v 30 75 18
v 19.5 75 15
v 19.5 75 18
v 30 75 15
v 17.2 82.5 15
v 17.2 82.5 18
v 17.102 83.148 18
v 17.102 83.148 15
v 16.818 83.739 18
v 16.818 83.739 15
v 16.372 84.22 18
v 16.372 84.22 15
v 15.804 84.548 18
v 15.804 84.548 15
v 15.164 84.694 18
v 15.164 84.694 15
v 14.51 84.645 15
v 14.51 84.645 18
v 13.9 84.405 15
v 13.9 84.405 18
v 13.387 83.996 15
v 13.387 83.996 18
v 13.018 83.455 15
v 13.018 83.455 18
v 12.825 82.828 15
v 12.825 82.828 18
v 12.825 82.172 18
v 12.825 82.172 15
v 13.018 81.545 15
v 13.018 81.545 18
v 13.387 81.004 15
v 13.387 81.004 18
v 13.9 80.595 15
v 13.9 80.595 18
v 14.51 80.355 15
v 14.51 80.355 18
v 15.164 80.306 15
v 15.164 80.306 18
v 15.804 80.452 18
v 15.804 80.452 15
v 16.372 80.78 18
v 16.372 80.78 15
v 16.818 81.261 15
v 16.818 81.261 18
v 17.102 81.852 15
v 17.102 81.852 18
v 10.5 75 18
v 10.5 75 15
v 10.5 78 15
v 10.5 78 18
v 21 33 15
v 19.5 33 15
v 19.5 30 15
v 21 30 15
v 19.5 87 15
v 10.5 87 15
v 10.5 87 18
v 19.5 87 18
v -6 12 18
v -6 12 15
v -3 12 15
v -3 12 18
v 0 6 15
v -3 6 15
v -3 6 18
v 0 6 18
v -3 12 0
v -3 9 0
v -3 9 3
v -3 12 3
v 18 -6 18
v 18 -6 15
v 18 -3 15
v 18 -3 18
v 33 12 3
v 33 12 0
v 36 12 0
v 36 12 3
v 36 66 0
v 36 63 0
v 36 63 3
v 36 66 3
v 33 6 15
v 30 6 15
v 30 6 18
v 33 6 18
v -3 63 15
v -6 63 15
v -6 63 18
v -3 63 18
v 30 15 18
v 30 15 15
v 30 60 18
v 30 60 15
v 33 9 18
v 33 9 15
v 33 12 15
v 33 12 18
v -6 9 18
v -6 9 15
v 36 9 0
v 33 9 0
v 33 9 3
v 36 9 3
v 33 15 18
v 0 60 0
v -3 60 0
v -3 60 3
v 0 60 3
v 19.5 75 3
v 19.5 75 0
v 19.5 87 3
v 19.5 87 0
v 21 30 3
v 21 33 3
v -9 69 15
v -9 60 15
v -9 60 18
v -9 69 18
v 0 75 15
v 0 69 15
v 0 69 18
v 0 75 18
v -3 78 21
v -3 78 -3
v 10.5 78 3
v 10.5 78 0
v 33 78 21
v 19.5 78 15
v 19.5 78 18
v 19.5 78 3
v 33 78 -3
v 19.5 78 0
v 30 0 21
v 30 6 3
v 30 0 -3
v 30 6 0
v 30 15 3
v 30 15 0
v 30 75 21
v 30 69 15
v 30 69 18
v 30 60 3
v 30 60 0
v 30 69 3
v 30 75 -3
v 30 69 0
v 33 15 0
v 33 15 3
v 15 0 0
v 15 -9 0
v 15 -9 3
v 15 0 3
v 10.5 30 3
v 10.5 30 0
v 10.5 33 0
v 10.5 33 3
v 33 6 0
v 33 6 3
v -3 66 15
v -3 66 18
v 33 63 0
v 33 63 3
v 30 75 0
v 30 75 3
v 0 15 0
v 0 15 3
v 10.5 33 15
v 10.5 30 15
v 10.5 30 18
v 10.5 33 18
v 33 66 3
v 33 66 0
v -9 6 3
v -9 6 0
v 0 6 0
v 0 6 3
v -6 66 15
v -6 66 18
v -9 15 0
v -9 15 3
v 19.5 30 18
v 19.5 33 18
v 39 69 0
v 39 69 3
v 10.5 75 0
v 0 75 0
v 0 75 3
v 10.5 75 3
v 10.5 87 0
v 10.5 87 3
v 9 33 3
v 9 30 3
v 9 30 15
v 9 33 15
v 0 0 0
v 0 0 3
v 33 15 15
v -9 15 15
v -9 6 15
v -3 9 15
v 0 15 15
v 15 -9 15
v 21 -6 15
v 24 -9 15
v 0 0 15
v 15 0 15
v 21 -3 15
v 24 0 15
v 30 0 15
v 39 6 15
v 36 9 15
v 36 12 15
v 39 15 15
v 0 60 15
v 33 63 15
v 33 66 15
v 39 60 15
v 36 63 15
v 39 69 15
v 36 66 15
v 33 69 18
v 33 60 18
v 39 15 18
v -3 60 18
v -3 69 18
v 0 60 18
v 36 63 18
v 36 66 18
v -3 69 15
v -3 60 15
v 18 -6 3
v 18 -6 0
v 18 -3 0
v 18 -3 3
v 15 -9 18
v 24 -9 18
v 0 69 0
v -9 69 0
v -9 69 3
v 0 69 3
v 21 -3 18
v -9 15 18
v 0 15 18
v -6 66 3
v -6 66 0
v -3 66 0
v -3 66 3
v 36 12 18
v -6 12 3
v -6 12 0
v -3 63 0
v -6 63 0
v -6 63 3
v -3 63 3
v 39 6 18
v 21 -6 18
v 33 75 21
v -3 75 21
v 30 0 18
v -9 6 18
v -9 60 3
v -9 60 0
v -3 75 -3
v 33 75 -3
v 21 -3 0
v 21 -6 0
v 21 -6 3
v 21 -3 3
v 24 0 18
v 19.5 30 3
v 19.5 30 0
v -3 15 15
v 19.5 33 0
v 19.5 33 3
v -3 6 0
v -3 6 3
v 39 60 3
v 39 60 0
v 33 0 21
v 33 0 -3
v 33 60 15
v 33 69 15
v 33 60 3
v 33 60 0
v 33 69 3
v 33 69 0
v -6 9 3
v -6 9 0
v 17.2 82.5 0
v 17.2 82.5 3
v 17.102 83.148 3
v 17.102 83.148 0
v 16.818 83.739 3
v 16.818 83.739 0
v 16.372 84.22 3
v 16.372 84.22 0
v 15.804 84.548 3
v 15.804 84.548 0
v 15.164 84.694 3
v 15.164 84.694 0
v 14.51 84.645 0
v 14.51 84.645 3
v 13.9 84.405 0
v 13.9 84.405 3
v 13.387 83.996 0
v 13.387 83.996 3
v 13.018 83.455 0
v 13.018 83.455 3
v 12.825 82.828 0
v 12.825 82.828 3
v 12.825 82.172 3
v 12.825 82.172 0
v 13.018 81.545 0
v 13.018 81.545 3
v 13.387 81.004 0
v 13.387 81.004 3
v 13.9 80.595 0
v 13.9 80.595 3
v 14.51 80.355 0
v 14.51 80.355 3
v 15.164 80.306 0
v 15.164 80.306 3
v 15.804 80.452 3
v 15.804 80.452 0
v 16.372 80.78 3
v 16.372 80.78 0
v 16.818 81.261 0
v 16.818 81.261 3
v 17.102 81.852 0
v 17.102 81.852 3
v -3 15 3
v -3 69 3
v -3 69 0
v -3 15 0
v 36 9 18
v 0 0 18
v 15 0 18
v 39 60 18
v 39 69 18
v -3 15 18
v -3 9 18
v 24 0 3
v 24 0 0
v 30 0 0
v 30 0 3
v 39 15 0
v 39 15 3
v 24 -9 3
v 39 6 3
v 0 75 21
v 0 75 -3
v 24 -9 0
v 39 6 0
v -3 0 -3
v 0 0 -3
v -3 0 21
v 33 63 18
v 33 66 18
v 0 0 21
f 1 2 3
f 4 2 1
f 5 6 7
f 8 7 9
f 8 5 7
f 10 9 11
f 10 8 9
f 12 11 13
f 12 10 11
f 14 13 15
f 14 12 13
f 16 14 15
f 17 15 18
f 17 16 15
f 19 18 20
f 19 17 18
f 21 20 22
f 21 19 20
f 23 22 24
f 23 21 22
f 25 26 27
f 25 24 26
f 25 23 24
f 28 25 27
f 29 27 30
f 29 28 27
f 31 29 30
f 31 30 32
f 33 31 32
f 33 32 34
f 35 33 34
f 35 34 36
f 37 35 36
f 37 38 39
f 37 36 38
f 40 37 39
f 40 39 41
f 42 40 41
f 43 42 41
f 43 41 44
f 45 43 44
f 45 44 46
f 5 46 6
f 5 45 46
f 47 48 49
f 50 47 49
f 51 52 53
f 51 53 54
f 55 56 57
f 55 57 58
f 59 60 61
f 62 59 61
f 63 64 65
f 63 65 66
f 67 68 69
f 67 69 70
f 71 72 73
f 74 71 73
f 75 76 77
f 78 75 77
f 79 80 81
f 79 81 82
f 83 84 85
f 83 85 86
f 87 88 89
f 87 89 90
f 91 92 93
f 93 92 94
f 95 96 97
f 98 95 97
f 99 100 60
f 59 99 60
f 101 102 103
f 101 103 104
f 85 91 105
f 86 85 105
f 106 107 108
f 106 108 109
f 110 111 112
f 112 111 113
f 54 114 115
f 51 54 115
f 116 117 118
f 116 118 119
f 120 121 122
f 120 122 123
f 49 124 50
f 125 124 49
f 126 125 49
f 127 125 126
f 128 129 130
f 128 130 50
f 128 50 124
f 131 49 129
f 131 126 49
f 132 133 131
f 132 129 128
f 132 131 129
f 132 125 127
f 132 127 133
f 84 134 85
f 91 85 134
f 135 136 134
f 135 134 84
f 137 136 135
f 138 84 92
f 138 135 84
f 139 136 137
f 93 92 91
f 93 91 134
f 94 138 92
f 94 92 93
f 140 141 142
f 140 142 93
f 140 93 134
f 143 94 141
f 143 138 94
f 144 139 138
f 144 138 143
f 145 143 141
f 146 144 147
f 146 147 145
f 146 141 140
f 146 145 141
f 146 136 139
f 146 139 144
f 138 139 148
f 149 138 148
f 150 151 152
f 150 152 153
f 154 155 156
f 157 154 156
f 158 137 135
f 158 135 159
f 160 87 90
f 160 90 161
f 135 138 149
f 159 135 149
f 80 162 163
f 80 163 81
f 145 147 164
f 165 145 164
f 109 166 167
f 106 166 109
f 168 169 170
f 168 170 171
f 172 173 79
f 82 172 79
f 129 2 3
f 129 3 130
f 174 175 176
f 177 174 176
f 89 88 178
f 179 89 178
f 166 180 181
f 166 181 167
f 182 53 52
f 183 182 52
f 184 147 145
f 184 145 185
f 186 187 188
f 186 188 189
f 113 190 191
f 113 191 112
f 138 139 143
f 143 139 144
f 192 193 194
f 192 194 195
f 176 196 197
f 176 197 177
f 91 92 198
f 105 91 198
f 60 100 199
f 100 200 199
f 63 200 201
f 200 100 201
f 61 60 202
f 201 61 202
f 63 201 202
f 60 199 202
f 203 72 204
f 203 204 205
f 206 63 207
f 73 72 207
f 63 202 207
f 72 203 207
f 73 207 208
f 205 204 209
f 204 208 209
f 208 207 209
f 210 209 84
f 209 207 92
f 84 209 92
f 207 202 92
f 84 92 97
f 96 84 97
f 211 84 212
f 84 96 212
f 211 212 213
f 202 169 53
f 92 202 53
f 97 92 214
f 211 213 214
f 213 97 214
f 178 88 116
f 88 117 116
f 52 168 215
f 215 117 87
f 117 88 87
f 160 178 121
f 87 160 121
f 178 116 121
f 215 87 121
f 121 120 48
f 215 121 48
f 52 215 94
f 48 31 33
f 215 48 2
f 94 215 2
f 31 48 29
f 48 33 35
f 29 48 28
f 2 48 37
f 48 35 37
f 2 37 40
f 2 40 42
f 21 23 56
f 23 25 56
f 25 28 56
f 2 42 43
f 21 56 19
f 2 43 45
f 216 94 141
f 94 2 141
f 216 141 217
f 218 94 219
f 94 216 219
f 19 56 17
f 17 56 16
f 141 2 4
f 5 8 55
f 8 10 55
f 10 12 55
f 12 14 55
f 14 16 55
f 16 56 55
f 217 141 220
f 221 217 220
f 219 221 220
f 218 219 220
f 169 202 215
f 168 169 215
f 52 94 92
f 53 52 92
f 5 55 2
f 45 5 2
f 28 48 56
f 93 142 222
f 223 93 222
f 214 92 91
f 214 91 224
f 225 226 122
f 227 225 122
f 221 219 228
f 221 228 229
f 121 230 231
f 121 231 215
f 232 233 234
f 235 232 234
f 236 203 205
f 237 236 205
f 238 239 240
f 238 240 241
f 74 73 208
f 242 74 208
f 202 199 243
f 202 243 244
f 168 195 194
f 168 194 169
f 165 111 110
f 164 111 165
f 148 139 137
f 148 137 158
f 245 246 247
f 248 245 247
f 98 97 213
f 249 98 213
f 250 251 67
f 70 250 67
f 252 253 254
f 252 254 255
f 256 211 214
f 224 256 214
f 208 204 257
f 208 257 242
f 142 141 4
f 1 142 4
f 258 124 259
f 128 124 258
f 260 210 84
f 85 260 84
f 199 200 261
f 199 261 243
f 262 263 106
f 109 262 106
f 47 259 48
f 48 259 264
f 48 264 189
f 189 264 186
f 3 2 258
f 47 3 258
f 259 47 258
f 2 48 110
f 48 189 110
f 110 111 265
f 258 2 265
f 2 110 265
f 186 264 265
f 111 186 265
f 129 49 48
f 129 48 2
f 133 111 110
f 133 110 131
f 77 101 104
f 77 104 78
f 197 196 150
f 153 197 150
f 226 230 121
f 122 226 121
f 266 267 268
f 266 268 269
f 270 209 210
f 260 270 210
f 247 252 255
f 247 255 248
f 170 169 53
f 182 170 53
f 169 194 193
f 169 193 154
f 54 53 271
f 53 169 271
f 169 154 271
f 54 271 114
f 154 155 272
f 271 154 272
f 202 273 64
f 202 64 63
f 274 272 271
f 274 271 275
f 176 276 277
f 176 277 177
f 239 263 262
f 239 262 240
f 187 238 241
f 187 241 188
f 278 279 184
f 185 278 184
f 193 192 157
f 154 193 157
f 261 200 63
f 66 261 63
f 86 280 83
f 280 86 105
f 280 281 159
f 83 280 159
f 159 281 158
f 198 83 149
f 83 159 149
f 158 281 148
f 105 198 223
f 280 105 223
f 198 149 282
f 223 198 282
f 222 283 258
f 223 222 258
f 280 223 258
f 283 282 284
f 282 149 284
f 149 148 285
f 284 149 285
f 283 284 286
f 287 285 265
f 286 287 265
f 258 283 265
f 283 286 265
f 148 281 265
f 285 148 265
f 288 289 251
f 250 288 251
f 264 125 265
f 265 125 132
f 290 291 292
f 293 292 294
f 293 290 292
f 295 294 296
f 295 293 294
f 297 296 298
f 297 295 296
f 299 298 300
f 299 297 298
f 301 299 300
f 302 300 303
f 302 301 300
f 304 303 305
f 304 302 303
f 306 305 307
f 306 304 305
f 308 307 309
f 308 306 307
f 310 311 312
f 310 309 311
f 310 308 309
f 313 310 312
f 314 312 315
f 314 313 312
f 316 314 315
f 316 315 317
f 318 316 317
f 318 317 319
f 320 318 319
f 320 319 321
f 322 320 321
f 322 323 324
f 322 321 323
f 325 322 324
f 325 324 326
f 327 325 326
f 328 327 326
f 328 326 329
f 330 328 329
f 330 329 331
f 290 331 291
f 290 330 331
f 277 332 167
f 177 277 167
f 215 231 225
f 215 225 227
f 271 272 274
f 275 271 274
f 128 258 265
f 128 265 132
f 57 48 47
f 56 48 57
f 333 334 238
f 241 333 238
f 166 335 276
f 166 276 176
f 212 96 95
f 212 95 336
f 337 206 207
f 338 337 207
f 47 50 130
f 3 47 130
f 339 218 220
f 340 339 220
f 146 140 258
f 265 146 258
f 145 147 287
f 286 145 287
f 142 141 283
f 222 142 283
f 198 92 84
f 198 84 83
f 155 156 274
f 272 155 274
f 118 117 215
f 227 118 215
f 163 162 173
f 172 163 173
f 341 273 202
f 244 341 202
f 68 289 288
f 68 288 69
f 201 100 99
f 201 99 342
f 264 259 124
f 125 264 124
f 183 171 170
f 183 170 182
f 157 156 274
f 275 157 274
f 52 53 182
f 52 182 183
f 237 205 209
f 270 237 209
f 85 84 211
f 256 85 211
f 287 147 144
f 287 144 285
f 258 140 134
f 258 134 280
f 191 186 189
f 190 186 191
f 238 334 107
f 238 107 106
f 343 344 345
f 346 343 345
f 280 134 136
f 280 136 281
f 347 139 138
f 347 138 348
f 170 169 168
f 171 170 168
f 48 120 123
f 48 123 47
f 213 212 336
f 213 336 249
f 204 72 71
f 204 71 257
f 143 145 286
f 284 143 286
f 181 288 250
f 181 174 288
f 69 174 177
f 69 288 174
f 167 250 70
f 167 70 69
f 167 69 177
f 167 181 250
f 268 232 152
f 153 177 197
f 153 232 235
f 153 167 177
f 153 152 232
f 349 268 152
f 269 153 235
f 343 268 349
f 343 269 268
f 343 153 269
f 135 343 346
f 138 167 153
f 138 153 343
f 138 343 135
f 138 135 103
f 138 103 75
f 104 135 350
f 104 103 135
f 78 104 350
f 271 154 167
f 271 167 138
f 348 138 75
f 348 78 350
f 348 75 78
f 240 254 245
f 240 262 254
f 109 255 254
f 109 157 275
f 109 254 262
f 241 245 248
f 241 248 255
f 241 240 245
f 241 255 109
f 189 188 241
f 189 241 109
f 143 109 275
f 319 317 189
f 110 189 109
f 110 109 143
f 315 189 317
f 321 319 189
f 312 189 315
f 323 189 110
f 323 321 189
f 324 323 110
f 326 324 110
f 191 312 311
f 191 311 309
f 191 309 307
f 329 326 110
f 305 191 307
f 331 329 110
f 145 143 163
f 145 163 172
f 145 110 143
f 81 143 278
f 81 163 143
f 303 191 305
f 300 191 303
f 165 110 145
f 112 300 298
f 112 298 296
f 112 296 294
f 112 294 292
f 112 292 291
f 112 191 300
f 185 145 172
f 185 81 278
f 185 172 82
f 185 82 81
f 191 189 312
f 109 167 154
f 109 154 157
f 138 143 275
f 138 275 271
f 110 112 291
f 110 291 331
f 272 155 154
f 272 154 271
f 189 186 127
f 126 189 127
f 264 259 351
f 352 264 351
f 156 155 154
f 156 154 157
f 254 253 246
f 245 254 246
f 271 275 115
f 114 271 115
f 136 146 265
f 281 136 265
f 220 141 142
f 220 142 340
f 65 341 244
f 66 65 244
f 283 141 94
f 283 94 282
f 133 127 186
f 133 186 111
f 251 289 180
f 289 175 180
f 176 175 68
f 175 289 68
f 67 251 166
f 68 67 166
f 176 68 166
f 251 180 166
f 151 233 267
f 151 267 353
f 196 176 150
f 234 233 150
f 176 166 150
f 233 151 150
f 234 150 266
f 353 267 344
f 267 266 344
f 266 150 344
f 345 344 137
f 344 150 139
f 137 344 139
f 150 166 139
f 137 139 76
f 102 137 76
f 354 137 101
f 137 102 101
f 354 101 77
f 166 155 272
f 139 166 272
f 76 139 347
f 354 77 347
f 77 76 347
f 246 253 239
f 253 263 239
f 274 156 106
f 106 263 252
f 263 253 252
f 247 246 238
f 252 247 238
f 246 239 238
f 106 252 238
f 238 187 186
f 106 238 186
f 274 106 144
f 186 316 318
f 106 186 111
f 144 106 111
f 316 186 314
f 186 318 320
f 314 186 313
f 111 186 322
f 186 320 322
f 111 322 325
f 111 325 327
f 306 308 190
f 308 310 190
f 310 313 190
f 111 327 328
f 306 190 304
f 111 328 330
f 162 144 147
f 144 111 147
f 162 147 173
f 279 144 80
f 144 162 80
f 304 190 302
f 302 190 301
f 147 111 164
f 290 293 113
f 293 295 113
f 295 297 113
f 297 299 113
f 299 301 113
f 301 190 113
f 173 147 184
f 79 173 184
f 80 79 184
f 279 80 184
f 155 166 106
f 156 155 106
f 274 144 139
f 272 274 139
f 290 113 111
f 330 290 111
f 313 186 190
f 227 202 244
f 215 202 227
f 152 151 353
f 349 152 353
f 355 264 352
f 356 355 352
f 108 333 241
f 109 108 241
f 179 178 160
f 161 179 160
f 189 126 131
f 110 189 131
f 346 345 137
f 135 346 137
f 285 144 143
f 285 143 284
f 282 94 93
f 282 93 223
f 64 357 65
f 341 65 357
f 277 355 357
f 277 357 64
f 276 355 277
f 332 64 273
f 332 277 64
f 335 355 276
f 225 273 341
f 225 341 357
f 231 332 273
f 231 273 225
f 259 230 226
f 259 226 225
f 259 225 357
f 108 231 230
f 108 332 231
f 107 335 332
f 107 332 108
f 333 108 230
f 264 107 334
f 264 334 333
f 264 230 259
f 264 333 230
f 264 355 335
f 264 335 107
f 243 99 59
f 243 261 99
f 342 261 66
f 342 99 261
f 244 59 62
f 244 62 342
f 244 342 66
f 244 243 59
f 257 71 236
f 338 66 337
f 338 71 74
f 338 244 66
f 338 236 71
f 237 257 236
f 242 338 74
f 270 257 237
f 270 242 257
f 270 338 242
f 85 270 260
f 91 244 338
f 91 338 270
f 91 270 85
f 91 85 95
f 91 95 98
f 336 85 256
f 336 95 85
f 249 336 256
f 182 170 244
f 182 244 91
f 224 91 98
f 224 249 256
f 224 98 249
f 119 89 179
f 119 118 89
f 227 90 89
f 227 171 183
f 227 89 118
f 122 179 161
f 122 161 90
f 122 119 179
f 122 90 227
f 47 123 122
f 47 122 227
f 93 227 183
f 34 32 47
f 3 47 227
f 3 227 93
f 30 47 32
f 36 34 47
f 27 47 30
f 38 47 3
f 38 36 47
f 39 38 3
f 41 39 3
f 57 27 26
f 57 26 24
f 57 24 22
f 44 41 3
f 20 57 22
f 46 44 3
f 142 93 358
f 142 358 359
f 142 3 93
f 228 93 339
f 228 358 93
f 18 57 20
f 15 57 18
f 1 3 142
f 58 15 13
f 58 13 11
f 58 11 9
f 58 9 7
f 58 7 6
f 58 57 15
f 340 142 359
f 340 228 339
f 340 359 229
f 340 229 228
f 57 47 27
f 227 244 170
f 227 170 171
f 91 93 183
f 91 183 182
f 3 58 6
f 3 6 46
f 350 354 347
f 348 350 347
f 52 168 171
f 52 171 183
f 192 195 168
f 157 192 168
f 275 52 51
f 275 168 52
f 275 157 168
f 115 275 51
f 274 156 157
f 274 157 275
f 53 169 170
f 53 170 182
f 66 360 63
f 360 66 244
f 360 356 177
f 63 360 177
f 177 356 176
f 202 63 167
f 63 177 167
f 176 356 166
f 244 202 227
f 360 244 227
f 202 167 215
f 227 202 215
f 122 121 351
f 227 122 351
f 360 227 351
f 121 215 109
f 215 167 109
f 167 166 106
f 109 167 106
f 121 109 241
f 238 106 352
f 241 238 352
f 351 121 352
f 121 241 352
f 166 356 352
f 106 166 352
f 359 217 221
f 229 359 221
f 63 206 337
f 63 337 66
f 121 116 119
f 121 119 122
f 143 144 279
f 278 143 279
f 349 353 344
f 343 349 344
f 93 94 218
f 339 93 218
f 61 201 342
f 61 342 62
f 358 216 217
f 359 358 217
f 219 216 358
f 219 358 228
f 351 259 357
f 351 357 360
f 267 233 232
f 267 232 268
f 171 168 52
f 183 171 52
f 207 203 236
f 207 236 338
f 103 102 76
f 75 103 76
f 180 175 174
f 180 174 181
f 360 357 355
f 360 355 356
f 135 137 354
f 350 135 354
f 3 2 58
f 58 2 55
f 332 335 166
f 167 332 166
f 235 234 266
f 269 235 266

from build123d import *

# Parameters (mm, degrees)
BOX_W             = 12
BOX_H             = 3
BOX_DEPTH         = 12
BOX111_W          = 9
BOX111_H          = 3
BOX111_DEPTH      = 3
BOX112_W          = 9
BOX112_H          = 3
BOX112_DEPTH      = 3
BOX125_W          = 9
BOX125_H          = 3
BOX125_DEPTH      = 3
BOX123_W          = 9
BOX123_H          = 3
BOX123_DEPTH      = 3
BOX124_W          = 36
BOX124_H          = 3
BOX124_DEPTH      = 24
BOX126_W          = 9
BOX126_H          = 3
BOX126_DEPTH      = 3
BOX084_W          = 3
BOX084_H          = 3
BOX084_DEPTH      = 4
BOX083_W          = 9
BOX083_H          = 9
BOX083_DEPTH      = 3
BOX086_W          = 3
BOX086_H          = 3
BOX086_DEPTH      = 4
BOX085_W          = 9
BOX085_H          = 9
BOX085_DEPTH      = 3
BOX088_W          = 3
BOX088_H          = 3
BOX088_DEPTH      = 4
BOX087_W          = 9
BOX087_H          = 9
BOX087_DEPTH      = 3
BOX004_W          = 3
BOX004_H          = 3
BOX004_DEPTH      = 4
BOX003_W          = 9
BOX003_H          = 9
BOX003_DEPTH      = 3
BOX005_W          = 9
BOX005_H          = 3
BOX005_DEPTH      = 3
BOX082_W          = 30
BOX082_H          = 75
BOX082_DEPTH      = 3
BOX002_W          = 3
BOX002_H          = 3
BOX002_DEPTH      = 4
BOX001_W          = 9
BOX001_H          = 9
BOX001_DEPTH      = 3
CYLINDER027_R     = 2.2
CYLINDER027_DEPTH = 10
BOX006_W          = 9
BOX006_H          = 9
BOX006_DEPTH      = 3
BOX113_W          = 3
BOX113_H          = 9
BOX113_DEPTH      = 3
BOX114_W          = 3
BOX114_H          = 9
BOX114_DEPTH      = 3
BOX115_W          = 3
BOX115_H          = 9
BOX115_DEPTH      = 3
BOX116_W          = 3
BOX116_H          = 9
BOX116_DEPTH      = 3
BOX117_W          = 3
BOX117_H          = 75
BOX117_DEPTH      = 24
BOX127_W          = 3
BOX127_H          = 9
BOX127_DEPTH      = 3
BOX128_W          = 3
BOX128_H          = 9
BOX128_DEPTH      = 3
BOX129_W          = 3
BOX129_H          = 9
BOX129_DEPTH      = 3
BOX130_W          = 3
BOX130_H          = 9
BOX130_DEPTH      = 3
BOX131_W          = 3
BOX131_H          = 75
BOX131_DEPTH      = 24
BOX145_W          = 9
BOX145_H          = 3
BOX145_DEPTH      = 3
BOX140_W          = 3
BOX140_H          = 3
BOX140_DEPTH      = 4
BOX139_W          = 9
BOX139_H          = 9
BOX139_DEPTH      = 3
BOX142_W          = 3
BOX142_H          = 3
BOX142_DEPTH      = 4
BOX141_W          = 9
BOX141_H          = 9
BOX141_DEPTH      = 3
BOX144_W          = 3
BOX144_H          = 3
BOX144_DEPTH      = 4
BOX143_W          = 9
BOX143_H          = 9
BOX143_DEPTH      = 3
BOX136_W          = 3
BOX136_H          = 3
BOX136_DEPTH      = 4
BOX135_W          = 9
BOX135_H          = 9
BOX135_DEPTH      = 3
BOX137_W          = 9
BOX137_H          = 3
BOX137_DEPTH      = 3
BOX132_W          = 30
BOX132_H          = 75
BOX132_DEPTH      = 3
BOX134_W          = 3
BOX134_H          = 3
BOX134_DEPTH      = 4
BOX133_W          = 9
BOX133_H          = 9
BOX133_DEPTH      = 3
CYLINDER028_R     = 2.2
CYLINDER028_DEPTH = 10
BOX138_W          = 9
BOX138_H          = 9
BOX138_DEPTH      = 3


with BuildPart() as cube:
    # Box → Box (new body)
    with BuildSketch(Plane(origin=(-0.5, 12, 3), x_dir=(1, 0, 0), z_dir=(0, 0, 1))):
        with Locations((6, 1.5)):
            Rectangle(BOX_W, BOX_H)
    extrude(amount=BOX_DEPTH)


with BuildPart() as cube033:
    # Box111 → Box111 (new body)
    with BuildSketch(Plane(origin=(1, 12, 15), x_dir=(1, 0, 0), z_dir=(0, 0, 1))):
        with Locations((4.5, 1.5)):
            Rectangle(BOX111_W, BOX111_H)
    extrude(amount=BOX111_DEPTH)


with BuildPart() as turretpitchholderdistant:
    # Box112 → Box112 (new body)
    with BuildSketch(Plane(origin=(1, 12, 0), x_dir=(1, 0, 0), z_dir=(0, 0, 1))):
        with Locations((4.5, 1.5)):
            Rectangle(BOX112_W, BOX112_H)
    extrude(amount=BOX112_DEPTH)

    # Fusion030: union Cube, Cube033
    add(cube.part)
    add(cube033.part)


with BuildPart() as turretpitchholderdistant_1:
    # Fusion030 placement: moved
    add(turretpitchholderdistant.part.moved(Location((9.5, 18, 0))))


with BuildPart() as cube047:
    # Box125 → Box125 (new body)
    with BuildSketch(Plane(origin=(10.5, -3, 15), x_dir=(1, 0, 0), z_dir=(0, 0, 1))):
        with Locations((4.5, 1.5)):
            Rectangle(BOX125_W, BOX125_H)
    extrude(amount=BOX125_DEPTH)


with BuildPart() as cube045:
    # Box123 → Box123 (new body)
    with BuildSketch(Plane(origin=(10.5, -3, 0), x_dir=(1, 0, 0), z_dir=(0, 0, 1))):
        with Locations((4.5, 1.5)):
            Rectangle(BOX123_W, BOX123_H)
    extrude(amount=BOX123_DEPTH)


with BuildPart() as turretpitchholdertopplate:
    # Box124 → Box124 (new body)
    with BuildSketch(Plane(origin=(-3, -3, -3), x_dir=(1, 0, 0), z_dir=(0, 0, 1))):
        with Locations((18, 1.5)):
            Rectangle(BOX124_W, BOX124_H)
    extrude(amount=BOX124_DEPTH)

    # Cut052: cut Cube045
    add(cube045.part, mode=Mode.SUBTRACT)

    # Cut058: cut Cube047
    add(cube047.part, mode=Mode.SUBTRACT)


with BuildPart() as turretpitchholdertopplate_1:
    # Cut058 placement: moved
    add(turretpitchholdertopplate.part.moved(Location((0, 78, 0))))


with BuildPart() as cube048:
    # Box126 → Box126 (new body)
    with BuildSketch(Plane(origin=(10.5, 75, 0), x_dir=(1, 0, 0), z_dir=(0, 0, 1))):
        with Locations((4.5, 1.5)):
            Rectangle(BOX126_W, BOX126_H)
    extrude(amount=BOX126_DEPTH)


with BuildPart() as cube014:
    # Box084 → Box084 (new body)
    with BuildSketch(Plane(origin=(-6, 9, 0), x_dir=(1, 0, 0), z_dir=(0, 0, 1))):
        with Locations((1.5, 1.5)):
            Rectangle(BOX084_W, BOX084_H)
    extrude(amount=BOX084_DEPTH)


with BuildPart() as cut035:
    # Box083 → Box083 (new body)
    with BuildSketch(Plane(origin=(-9, 6, 0), x_dir=(1, 0, 0), z_dir=(0, 0, 1))):
        with Locations((4.5, 4.5)):
            Rectangle(BOX083_W, BOX083_H)
    extrude(amount=BOX083_DEPTH)

    # Cut035: cut Cube014
    add(cube014.part, mode=Mode.SUBTRACT)


with BuildPart() as cut035_1:
    # Cut035 placement: moved
    add(cut035.part.moved(Location((24, -15, 0))))


with BuildPart() as cube016:
    # Box086 → Box086 (new body)
    with BuildSketch(Plane(origin=(-6, 9, 0), x_dir=(1, 0, 0), z_dir=(0, 0, 1))):
        with Locations((1.5, 1.5)):
            Rectangle(BOX086_W, BOX086_H)
    extrude(amount=BOX086_DEPTH)


with BuildPart() as cut036:
    # Box085 → Box085 (new body)
    with BuildSketch(Plane(origin=(-9, 6, 0), x_dir=(1, 0, 0), z_dir=(0, 0, 1))):
        with Locations((4.5, 4.5)):
            Rectangle(BOX085_W, BOX085_H)
    extrude(amount=BOX085_DEPTH)

    # Cut036: cut Cube016
    add(cube016.part, mode=Mode.SUBTRACT)


with BuildPart() as cut036_1:
    # Cut036 placement: moved
    add(cut036.part.moved(Location((39, 54, 0))))


with BuildPart() as cube018:
    # Box088 → Box088 (new body)
    with BuildSketch(Plane(origin=(-6, 9, 0), x_dir=(1, 0, 0), z_dir=(0, 0, 1))):
        with Locations((1.5, 1.5)):
            Rectangle(BOX088_W, BOX088_H)
    extrude(amount=BOX088_DEPTH)


with BuildPart() as cut037:
    # Box087 → Box087 (new body)
    with BuildSketch(Plane(origin=(-9, 6, 0), x_dir=(1, 0, 0), z_dir=(0, 0, 1))):
        with Locations((4.5, 4.5)):
            Rectangle(BOX087_W, BOX087_H)
    extrude(amount=BOX087_DEPTH)

    # Cut037: cut Cube018
    add(cube018.part, mode=Mode.SUBTRACT)


with BuildPart() as cut037_1:
    # Cut037 placement: moved
    add(cut037.part.moved(Location((0, 54, 0))))


with BuildPart() as cube010:
    # Box004 → Box004 (new body)
    with BuildSketch(Plane(origin=(-6, 9, 0), x_dir=(1, 0, 0), z_dir=(0, 0, 1))):
        with Locations((1.5, 1.5)):
            Rectangle(BOX004_W, BOX004_H)
    extrude(amount=BOX004_DEPTH)


with BuildPart() as cut001:
    # Box003 → Box003 (new body)
    with BuildSketch(Plane(origin=(-9, 6, 0), x_dir=(1, 0, 0), z_dir=(0, 0, 1))):
        with Locations((4.5, 4.5)):
            Rectangle(BOX003_W, BOX003_H)
    extrude(amount=BOX003_DEPTH)

    # Cut001: cut Cube010
    add(cube010.part, mode=Mode.SUBTRACT)


with BuildPart() as cut001_1:
    # Cut001 placement: moved
    add(cut001.part.moved(Location((39, 0, 0))))


with BuildPart() as cube011:
    # Box005 → Box005 (new body)
    with BuildSketch(Plane(origin=(10.5, 30, 0), x_dir=(1, 0, 0), z_dir=(0, 0, 1))):
        with Locations((4.5, 1.5)):
            Rectangle(BOX005_W, BOX005_H)
    extrude(amount=BOX005_DEPTH)


with BuildPart() as cut002:
    # Box082 → Box082 (new body)
    with BuildSketch(Plane.XY):
        with Locations((15, 37.5)):
            Rectangle(BOX082_W, BOX082_H)
    extrude(amount=BOX082_DEPTH)

    # Cut002: cut Cube011
    add(cube011.part, mode=Mode.SUBTRACT)


with BuildPart() as cube008:
    # Box002 → Box002 (new body)
    with BuildSketch(Plane(origin=(-6, 9, 0), x_dir=(1, 0, 0), z_dir=(0, 0, 1))):
        with Locations((1.5, 1.5)):
            Rectangle(BOX002_W, BOX002_H)
    extrude(amount=BOX002_DEPTH)


with BuildPart() as fusion027:
    # Box001 → Box001 (new body)
    with BuildSketch(Plane(origin=(-9, 6, 0), x_dir=(1, 0, 0), z_dir=(0, 0, 1))):
        with Locations((4.5, 4.5)):
            Rectangle(BOX001_W, BOX001_H)
    extrude(amount=BOX001_DEPTH)

    # Cut034: cut Cube008
    add(cube008.part, mode=Mode.SUBTRACT)

    # Fusion027: union Cut001, Cut002
    add(cut001_1.part)
    add(cut002.part)


with BuildPart() as rotationhoie:
    # Cylinder027 → Cylinder027 (new body)
    with BuildSketch(Plane(origin=(15, 40.5, 0), x_dir=(1, 0, 0), z_dir=(0, 0, 1))):
        Circle(CYLINDER027_R)
    extrude(amount=CYLINDER027_DEPTH)


with BuildPart() as turretpitchholderside:
    # Box006 → Box006 (new body)
    with BuildSketch(Plane(origin=(10.5, 36, 0), x_dir=(1, 0, 0), z_dir=(0, 0, 1))):
        with Locations((4.5, 4.5)):
            Rectangle(BOX006_W, BOX006_H)
    extrude(amount=BOX006_DEPTH)

    # Cut003: cut RotationHoie
    add(rotationhoie.part, mode=Mode.SUBTRACT)


with BuildPart() as turretpitchholderside_1:
    # Cut003 placement: moved
    add(turretpitchholderside.part.moved(Location((0, 42, 0))))

    # Fusion: union Cut035, Cut036, Cut037, Fusion027
    add(cut035_1.part)
    add(cut036_1.part)
    add(cut037_1.part)
    add(fusion027.part)

    # Fusion031: union Cube048
    add(cube048.part)


with BuildPart() as cube035:
    # Box113 → Box113 (new body)
    with BuildSketch(Plane(origin=(30, 60, 0), x_dir=(1, 0, 0), z_dir=(0, 0, 1))):
        with Locations((1.5, 4.5)):
            Rectangle(BOX113_W, BOX113_H)
    extrude(amount=BOX113_DEPTH)


with BuildPart() as cube036:
    # Box114 → Box114 (new body)
    with BuildSketch(Plane(origin=(39, 6, 0), x_dir=(1, 0, 0), z_dir=(0, 0, 1))):
        with Locations((1.5, 4.5)):
            Rectangle(BOX114_W, BOX114_H)
    extrude(amount=BOX114_DEPTH)


with BuildPart() as cube037:
    # Box115 → Box115 (new body)
    with BuildSketch(Plane(origin=(39, 6, 15), x_dir=(1, 0, 0), z_dir=(0, 0, 1))):
        with Locations((1.5, 4.5)):
            Rectangle(BOX115_W, BOX115_H)
    extrude(amount=BOX115_DEPTH)


with BuildPart() as cube038:
    # Box116 → Box116 (new body)
    with BuildSketch(Plane(origin=(39, 60, 15), x_dir=(1, 0, 0), z_dir=(0, 0, 1))):
        with Locations((1.5, 4.5)):
            Rectangle(BOX116_W, BOX116_H)
    extrude(amount=BOX116_DEPTH)


with BuildPart() as turretpitchholdersideplate:
    # Box117 → Box117 (new body)
    with BuildSketch(Plane(origin=(39, 0, -3), x_dir=(1, 0, 0), z_dir=(0, 0, 1))):
        with Locations((1.5, 37.5)):
            Rectangle(BOX117_W, BOX117_H)
    extrude(amount=BOX117_DEPTH)

    # Cut: cut Cube038
    add(cube038.part, mode=Mode.SUBTRACT)

    # Cut045: cut Cube037
    add(cube037.part, mode=Mode.SUBTRACT)

    # Cut046: cut Cube036
    add(cube036.part, mode=Mode.SUBTRACT)

    # Cut047: cut Cube035
    add(cube035.part, mode=Mode.SUBTRACT)


with BuildPart() as turretpitchholdersideplate_1:
    # Cut047 placement: moved
    add(turretpitchholdersideplate.part.moved(Location((-9, 0, 0))))

    # Cut059: cut Cube035
    add(cube035.part, mode=Mode.SUBTRACT)


with BuildPart() as cube049:
    # Box127 → Box127 (new body)
    with BuildSketch(Plane(origin=(30, 60, 0), x_dir=(1, 0, 0), z_dir=(0, 0, 1))):
        with Locations((1.5, 4.5)):
            Rectangle(BOX127_W, BOX127_H)
    extrude(amount=BOX127_DEPTH)


with BuildPart() as cube050:
    # Box128 → Box128 (new body)
    with BuildSketch(Plane(origin=(39, 6, 0), x_dir=(1, 0, 0), z_dir=(0, 0, 1))):
        with Locations((1.5, 4.5)):
            Rectangle(BOX128_W, BOX128_H)
    extrude(amount=BOX128_DEPTH)


with BuildPart() as cube051:
    # Box129 → Box129 (new body)
    with BuildSketch(Plane(origin=(39, 6, 15), x_dir=(1, 0, 0), z_dir=(0, 0, 1))):
        with Locations((1.5, 4.5)):
            Rectangle(BOX129_W, BOX129_H)
    extrude(amount=BOX129_DEPTH)


with BuildPart() as cube052:
    # Box130 → Box130 (new body)
    with BuildSketch(Plane(origin=(39, 60, 15), x_dir=(1, 0, 0), z_dir=(0, 0, 1))):
        with Locations((1.5, 4.5)):
            Rectangle(BOX130_W, BOX130_H)
    extrude(amount=BOX130_DEPTH)


with BuildPart() as turretpitchholdersideplate001:
    # Box131 → Box131 (new body)
    with BuildSketch(Plane(origin=(39, 0, -3), x_dir=(1, 0, 0), z_dir=(0, 0, 1))):
        with Locations((1.5, 37.5)):
            Rectangle(BOX131_W, BOX131_H)
    extrude(amount=BOX131_DEPTH)

    # Cut060: cut Cube052
    add(cube052.part, mode=Mode.SUBTRACT)

    # Cut061: cut Cube051
    add(cube051.part, mode=Mode.SUBTRACT)

    # Cut062: cut Cube050
    add(cube050.part, mode=Mode.SUBTRACT)

    # Cut063: cut Cube049
    add(cube049.part, mode=Mode.SUBTRACT)


with BuildPart() as turretpitchholdersideplate001_1:
    # Cut063 placement: moved
    add(turretpitchholdersideplate001.part.moved(Location((-9, 0, 0))))

    # Cut064: cut Cube049
    add(cube049.part, mode=Mode.SUBTRACT)


with BuildPart() as turretpitchholdersideplate001_2:
    # Cut064 placement: moved
    add(turretpitchholdersideplate001_1.part.moved(Location((-33, 0, 0))))


with BuildPart() as cube067:
    # Box145 → Box145 (new body)
    with BuildSketch(Plane(origin=(10.5, 75, 0), x_dir=(1, 0, 0), z_dir=(0, 0, 1))):
        with Locations((4.5, 1.5)):
            Rectangle(BOX145_W, BOX145_H)
    extrude(amount=BOX145_DEPTH)


with BuildPart() as cube062:
    # Box140 → Box140 (new body)
    with BuildSketch(Plane(origin=(-6, 9, 0), x_dir=(1, 0, 0), z_dir=(0, 0, 1))):
        with Locations((1.5, 1.5)):
            Rectangle(BOX140_W, BOX140_H)
    extrude(amount=BOX140_DEPTH)


with BuildPart() as cut069:
    # Box139 → Box139 (new body)
    with BuildSketch(Plane(origin=(-9, 6, 0), x_dir=(1, 0, 0), z_dir=(0, 0, 1))):
        with Locations((4.5, 4.5)):
            Rectangle(BOX139_W, BOX139_H)
    extrude(amount=BOX139_DEPTH)

    # Cut069: cut Cube062
    add(cube062.part, mode=Mode.SUBTRACT)


with BuildPart() as cut069_1:
    # Cut069 placement: moved
    add(cut069.part.moved(Location((24, -15, 0))))


with BuildPart() as cube064:
    # Box142 → Box142 (new body)
    with BuildSketch(Plane(origin=(-6, 9, 0), x_dir=(1, 0, 0), z_dir=(0, 0, 1))):
        with Locations((1.5, 1.5)):
            Rectangle(BOX142_W, BOX142_H)
    extrude(amount=BOX142_DEPTH)


with BuildPart() as cut070:
    # Box141 → Box141 (new body)
    with BuildSketch(Plane(origin=(-9, 6, 0), x_dir=(1, 0, 0), z_dir=(0, 0, 1))):
        with Locations((4.5, 4.5)):
            Rectangle(BOX141_W, BOX141_H)
    extrude(amount=BOX141_DEPTH)

    # Cut070: cut Cube064
    add(cube064.part, mode=Mode.SUBTRACT)


with BuildPart() as cut070_1:
    # Cut070 placement: moved
    add(cut070.part.moved(Location((39, 54, 0))))


with BuildPart() as cube066:
    # Box144 → Box144 (new body)
    with BuildSketch(Plane(origin=(-6, 9, 0), x_dir=(1, 0, 0), z_dir=(0, 0, 1))):
        with Locations((1.5, 1.5)):
            Rectangle(BOX144_W, BOX144_H)
    extrude(amount=BOX144_DEPTH)


with BuildPart() as cut071:
    # Box143 → Box143 (new body)
    with BuildSketch(Plane(origin=(-9, 6, 0), x_dir=(1, 0, 0), z_dir=(0, 0, 1))):
        with Locations((4.5, 4.5)):
            Rectangle(BOX143_W, BOX143_H)
    extrude(amount=BOX143_DEPTH)

    # Cut071: cut Cube066
    add(cube066.part, mode=Mode.SUBTRACT)


with BuildPart() as cut071_1:
    # Cut071 placement: moved
    add(cut071.part.moved(Location((0, 54, 0))))


with BuildPart() as cube058:
    # Box136 → Box136 (new body)
    with BuildSketch(Plane(origin=(-6, 9, 0), x_dir=(1, 0, 0), z_dir=(0, 0, 1))):
        with Locations((1.5, 1.5)):
            Rectangle(BOX136_W, BOX136_H)
    extrude(amount=BOX136_DEPTH)


with BuildPart() as cut066:
    # Box135 → Box135 (new body)
    with BuildSketch(Plane(origin=(-9, 6, 0), x_dir=(1, 0, 0), z_dir=(0, 0, 1))):
        with Locations((4.5, 4.5)):
            Rectangle(BOX135_W, BOX135_H)
    extrude(amount=BOX135_DEPTH)

    # Cut066: cut Cube058
    add(cube058.part, mode=Mode.SUBTRACT)


with BuildPart() as cut066_1:
    # Cut066 placement: moved
    add(cut066.part.moved(Location((39, 0, 0))))


with BuildPart() as cube059:
    # Box137 → Box137 (new body)
    with BuildSketch(Plane(origin=(10.5, 30, 0), x_dir=(1, 0, 0), z_dir=(0, 0, 1))):
        with Locations((4.5, 1.5)):
            Rectangle(BOX137_W, BOX137_H)
    extrude(amount=BOX137_DEPTH)


with BuildPart() as cut067:
    # Box132 → Box132 (new body)
    with BuildSketch(Plane.XY):
        with Locations((15, 37.5)):
            Rectangle(BOX132_W, BOX132_H)
    extrude(amount=BOX132_DEPTH)

    # Cut067: cut Cube059
    add(cube059.part, mode=Mode.SUBTRACT)


with BuildPart() as cube056:
    # Box134 → Box134 (new body)
    with BuildSketch(Plane(origin=(-6, 9, 0), x_dir=(1, 0, 0), z_dir=(0, 0, 1))):
        with Locations((1.5, 1.5)):
            Rectangle(BOX134_W, BOX134_H)
    extrude(amount=BOX134_DEPTH)


with BuildPart() as fusion032:
    # Box133 → Box133 (new body)
    with BuildSketch(Plane(origin=(-9, 6, 0), x_dir=(1, 0, 0), z_dir=(0, 0, 1))):
        with Locations((4.5, 4.5)):
            Rectangle(BOX133_W, BOX133_H)
    extrude(amount=BOX133_DEPTH)

    # Cut065: cut Cube056
    add(cube056.part, mode=Mode.SUBTRACT)

    # Fusion032: union Cut066, Cut067
    add(cut066_1.part)
    add(cut067.part)


with BuildPart() as rotationhoie001:
    # Cylinder028 → Cylinder028 (new body)
    with BuildSketch(Plane(origin=(15, 40.5, 0), x_dir=(1, 0, 0), z_dir=(0, 0, 1))):
        Circle(CYLINDER028_R)
    extrude(amount=CYLINDER028_DEPTH)


with BuildPart() as turretpitchholderside001:
    # Box138 → Box138 (new body)
    with BuildSketch(Plane(origin=(10.5, 36, 0), x_dir=(1, 0, 0), z_dir=(0, 0, 1))):
        with Locations((4.5, 4.5)):
            Rectangle(BOX138_W, BOX138_H)
    extrude(amount=BOX138_DEPTH)

    # Cut068: cut RotationHoie001
    add(rotationhoie001.part, mode=Mode.SUBTRACT)


with BuildPart() as turretpitchholderside001_1:
    # Cut068 placement: moved
    add(turretpitchholderside001.part.moved(Location((0, 42, 0))))

    # Fusion033: union Cut069, Cut070, Cut071, Fusion032
    add(cut069_1.part)
    add(cut070_1.part)
    add(cut071_1.part)
    add(fusion032.part)

    # Fusion034: union Cube067
    add(cube067.part)


with BuildPart() as turretpitchholderside001_2:
    # Fusion034 placement: moved
    add(turretpitchholderside001_1.part.moved(Location((0, 0, 15))))


solid = Compound([turretpitchholderdistant_1.part, turretpitchholdertopplate_1.part, turretpitchholderside_1.part, turretpitchholdersideplate_1.part, turretpitchholdersideplate001_2.part, turretpitchholderside001_2.part])
